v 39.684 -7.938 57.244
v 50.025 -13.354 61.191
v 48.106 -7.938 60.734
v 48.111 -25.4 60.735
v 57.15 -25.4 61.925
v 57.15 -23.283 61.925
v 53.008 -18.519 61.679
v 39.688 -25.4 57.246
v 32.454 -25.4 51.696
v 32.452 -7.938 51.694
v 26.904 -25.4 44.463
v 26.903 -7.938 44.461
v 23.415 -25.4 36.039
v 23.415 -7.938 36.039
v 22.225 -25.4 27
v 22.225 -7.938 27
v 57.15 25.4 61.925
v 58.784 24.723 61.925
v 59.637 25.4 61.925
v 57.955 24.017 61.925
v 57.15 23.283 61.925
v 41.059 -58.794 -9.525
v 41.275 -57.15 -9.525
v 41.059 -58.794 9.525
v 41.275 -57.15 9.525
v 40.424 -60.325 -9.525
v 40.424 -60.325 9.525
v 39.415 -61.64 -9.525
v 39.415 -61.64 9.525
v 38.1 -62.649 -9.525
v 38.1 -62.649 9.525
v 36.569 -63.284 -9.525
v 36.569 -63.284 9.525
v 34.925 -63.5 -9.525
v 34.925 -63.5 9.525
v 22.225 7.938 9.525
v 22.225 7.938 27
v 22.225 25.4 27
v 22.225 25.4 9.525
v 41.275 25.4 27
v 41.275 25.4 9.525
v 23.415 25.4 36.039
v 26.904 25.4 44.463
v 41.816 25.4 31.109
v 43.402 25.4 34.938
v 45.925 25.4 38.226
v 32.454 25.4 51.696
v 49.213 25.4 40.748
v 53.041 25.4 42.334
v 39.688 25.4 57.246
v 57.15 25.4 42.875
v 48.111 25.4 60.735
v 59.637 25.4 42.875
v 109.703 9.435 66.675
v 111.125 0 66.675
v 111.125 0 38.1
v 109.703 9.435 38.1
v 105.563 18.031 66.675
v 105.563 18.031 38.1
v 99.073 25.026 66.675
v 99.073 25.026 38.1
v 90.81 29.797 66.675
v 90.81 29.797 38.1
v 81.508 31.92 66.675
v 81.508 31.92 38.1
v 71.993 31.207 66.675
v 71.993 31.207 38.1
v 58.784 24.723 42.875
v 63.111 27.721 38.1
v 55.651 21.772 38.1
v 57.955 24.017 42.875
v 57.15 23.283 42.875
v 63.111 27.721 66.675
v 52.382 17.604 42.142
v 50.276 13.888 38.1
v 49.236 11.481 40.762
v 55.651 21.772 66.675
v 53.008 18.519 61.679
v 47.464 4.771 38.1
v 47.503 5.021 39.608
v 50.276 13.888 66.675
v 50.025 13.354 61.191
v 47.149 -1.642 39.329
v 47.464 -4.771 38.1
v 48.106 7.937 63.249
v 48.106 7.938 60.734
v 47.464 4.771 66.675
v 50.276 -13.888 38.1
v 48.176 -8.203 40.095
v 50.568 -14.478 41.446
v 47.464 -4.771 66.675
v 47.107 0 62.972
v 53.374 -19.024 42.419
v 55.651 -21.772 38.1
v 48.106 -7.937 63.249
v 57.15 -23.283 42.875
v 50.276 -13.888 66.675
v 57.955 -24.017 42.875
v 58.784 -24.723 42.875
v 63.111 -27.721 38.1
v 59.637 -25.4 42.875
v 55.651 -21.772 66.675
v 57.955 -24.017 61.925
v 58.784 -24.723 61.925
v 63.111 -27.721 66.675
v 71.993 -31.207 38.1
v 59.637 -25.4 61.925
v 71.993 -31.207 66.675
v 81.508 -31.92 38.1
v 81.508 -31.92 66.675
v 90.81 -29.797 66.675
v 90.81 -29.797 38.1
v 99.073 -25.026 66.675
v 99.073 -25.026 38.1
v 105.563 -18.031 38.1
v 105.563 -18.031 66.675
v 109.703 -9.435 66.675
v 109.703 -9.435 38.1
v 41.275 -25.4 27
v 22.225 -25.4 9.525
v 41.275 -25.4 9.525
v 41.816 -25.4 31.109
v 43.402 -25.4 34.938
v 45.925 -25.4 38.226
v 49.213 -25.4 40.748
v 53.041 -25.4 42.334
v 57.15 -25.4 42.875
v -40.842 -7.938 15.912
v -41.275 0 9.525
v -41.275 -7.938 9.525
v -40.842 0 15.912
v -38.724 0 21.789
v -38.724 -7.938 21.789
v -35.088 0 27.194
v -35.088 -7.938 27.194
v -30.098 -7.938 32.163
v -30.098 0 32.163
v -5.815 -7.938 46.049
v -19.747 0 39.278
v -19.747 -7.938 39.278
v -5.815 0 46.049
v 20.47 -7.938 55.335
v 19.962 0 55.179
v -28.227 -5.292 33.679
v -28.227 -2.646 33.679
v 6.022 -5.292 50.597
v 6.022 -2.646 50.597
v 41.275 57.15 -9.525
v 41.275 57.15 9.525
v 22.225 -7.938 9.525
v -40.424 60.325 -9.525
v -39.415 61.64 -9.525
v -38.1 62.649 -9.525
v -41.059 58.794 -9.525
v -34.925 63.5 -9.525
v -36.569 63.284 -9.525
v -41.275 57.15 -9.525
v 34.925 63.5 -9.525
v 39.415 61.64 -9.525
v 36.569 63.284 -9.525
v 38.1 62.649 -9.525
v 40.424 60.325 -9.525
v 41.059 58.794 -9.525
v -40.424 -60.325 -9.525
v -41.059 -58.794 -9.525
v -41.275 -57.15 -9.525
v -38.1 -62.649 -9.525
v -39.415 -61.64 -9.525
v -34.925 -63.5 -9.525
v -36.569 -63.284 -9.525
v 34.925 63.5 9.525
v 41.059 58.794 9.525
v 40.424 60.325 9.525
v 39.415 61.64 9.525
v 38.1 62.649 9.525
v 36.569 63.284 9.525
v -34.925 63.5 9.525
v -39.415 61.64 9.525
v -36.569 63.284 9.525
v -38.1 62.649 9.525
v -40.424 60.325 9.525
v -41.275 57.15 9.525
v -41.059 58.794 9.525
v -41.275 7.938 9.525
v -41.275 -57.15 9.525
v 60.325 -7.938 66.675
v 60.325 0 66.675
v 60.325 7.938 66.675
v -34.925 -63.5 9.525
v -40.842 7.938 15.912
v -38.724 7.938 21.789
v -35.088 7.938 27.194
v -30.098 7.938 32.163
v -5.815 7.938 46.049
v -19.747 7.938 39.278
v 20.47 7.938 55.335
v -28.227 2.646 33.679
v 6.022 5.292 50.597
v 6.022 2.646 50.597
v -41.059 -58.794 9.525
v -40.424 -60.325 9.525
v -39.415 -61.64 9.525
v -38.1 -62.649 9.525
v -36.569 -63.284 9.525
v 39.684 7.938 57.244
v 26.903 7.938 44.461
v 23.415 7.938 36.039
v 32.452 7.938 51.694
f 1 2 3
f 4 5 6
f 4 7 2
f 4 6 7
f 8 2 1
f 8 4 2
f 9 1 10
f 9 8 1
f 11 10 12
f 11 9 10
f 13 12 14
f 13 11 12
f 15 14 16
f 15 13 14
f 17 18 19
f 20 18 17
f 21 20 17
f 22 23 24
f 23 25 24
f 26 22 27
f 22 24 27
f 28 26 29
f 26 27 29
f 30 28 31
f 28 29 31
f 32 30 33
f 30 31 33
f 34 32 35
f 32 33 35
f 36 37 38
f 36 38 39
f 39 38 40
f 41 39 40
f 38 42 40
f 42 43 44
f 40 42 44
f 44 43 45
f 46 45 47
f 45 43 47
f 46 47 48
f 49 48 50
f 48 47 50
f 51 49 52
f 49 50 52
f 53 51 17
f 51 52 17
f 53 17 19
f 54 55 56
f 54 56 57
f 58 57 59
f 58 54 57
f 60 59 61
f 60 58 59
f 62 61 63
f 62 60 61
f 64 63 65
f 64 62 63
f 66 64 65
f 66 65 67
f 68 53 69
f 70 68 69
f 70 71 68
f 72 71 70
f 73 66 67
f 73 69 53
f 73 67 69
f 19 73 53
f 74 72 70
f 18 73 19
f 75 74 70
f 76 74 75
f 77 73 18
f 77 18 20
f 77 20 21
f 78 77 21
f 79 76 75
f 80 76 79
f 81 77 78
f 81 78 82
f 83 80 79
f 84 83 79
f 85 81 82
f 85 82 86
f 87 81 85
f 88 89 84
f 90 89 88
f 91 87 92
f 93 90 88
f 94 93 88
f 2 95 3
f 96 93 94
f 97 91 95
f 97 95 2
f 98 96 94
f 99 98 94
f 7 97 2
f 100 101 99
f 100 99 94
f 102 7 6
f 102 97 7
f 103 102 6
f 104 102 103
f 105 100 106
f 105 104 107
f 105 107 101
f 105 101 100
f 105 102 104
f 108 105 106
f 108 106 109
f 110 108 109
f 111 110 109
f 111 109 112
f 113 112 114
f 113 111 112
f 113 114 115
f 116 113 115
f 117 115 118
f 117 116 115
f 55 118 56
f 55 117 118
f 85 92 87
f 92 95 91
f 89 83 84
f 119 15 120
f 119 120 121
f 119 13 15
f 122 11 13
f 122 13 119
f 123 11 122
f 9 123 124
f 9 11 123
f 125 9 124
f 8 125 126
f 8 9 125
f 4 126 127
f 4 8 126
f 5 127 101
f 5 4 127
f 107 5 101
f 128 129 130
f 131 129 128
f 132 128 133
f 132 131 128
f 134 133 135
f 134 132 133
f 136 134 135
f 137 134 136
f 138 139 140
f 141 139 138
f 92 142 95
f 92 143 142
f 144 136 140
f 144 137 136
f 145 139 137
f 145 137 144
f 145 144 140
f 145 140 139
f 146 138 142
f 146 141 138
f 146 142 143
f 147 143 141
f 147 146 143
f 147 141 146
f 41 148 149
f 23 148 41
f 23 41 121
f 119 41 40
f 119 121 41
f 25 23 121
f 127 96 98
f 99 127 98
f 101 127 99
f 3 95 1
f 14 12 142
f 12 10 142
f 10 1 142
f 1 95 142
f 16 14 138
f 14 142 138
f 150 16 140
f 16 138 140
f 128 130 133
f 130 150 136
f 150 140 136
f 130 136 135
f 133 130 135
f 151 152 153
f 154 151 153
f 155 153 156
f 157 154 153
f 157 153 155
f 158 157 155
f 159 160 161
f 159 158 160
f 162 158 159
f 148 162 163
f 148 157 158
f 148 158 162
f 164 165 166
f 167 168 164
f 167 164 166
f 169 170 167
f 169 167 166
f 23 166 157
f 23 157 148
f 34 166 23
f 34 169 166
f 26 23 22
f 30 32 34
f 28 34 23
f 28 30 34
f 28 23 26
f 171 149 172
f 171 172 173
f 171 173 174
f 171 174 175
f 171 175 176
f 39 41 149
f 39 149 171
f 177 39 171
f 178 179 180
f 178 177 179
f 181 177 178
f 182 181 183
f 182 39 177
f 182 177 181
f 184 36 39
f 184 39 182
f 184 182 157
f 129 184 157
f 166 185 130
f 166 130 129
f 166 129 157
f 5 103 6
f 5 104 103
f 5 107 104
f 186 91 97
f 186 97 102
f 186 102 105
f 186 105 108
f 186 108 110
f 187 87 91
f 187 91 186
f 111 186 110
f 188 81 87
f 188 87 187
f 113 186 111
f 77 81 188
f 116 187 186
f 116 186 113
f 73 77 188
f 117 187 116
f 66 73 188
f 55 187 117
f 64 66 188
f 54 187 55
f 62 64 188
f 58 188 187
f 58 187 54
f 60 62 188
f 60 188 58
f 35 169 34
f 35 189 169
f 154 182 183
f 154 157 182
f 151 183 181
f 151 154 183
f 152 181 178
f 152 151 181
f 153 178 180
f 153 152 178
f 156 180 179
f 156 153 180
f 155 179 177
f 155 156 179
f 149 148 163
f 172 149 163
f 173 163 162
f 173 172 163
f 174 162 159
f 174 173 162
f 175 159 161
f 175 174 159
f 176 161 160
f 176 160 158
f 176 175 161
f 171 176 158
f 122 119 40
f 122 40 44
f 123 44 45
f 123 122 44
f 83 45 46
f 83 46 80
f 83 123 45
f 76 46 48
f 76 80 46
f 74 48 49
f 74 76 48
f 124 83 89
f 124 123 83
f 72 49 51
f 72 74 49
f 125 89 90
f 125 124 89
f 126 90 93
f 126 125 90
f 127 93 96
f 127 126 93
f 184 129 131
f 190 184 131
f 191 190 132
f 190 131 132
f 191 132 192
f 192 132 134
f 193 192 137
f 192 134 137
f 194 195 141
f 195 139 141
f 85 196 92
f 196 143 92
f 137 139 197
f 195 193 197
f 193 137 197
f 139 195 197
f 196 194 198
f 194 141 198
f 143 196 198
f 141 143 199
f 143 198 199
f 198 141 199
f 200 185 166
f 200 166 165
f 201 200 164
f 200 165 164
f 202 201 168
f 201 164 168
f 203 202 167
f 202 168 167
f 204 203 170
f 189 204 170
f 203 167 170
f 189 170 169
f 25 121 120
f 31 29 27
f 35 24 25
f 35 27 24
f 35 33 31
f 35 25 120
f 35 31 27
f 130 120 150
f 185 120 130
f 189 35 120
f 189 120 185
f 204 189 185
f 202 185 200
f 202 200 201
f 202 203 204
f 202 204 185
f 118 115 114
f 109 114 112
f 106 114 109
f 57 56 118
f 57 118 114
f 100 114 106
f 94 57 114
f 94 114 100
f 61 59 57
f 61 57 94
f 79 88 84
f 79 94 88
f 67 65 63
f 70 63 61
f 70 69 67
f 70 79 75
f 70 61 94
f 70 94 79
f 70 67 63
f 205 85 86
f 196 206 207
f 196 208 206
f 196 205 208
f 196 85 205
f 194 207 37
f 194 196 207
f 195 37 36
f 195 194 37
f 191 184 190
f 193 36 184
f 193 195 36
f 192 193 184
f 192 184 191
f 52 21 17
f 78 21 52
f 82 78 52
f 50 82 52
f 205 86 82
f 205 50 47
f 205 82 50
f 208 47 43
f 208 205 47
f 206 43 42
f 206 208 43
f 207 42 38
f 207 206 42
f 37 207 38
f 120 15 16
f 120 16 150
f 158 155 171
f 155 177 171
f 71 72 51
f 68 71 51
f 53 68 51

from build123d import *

# Parameters (mm, degrees)
F1_DEPTH = 63.5
F2_DEPTH = 25.4
F3_DEPTH = 7.9375
F5_R     = 6.35


with BuildPart() as f1:
    # F0 (on Front) → F1 (new body, symmetric)
    with BuildSketch(Plane.XZ):
        Polygon((-41.275, -9.525), (41.275, -9.525), (41.275, 9.525), (22.225, 9.525), (-41.275, 9.525), align=None)
    extrude(amount=F1_DEPTH, both=True)

    # F0 (on Front) → F2 (join, symmetric)
    with BuildSketch(Plane.XZ):
        with BuildLine():
            Line((22.225, 9.525), (41.275, 9.525))
            Line((41.275, 9.525), (41.275, 27.0002))
            ThreePointArc((41.275, 27.0002), (45.92468, 38.22552), (57.15, 42.8752))
            Line((57.15, 42.8752), (60.325, 42.8752))
            Line((60.325, 42.8752), (60.325, 61.9252))
            Line((60.325, 61.9252), (57.15, 61.9252))
            ThreePointArc((57.15, 61.9252), (32.454296, 51.695904), (22.225, 27.0002))
            Line((22.225, 27.0002), (22.225, 9.525))
        make_face()
    extrude(amount=F2_DEPTH, both=True)

    # F0 (on Front) → F3 (join, symmetric)
    with BuildSketch(Plane.XZ):
        with BuildLine():
            add(Edge.make_bspline(
                [(-41.275, 9.525), (-43.483493, 41.179909), (17.105941, 54.288729), (60.325, 66.675)],
                knots=[0, 0, 0, 0, 116.570504, 116.570504, 116.570504, 116.570504], degree=3))
            Line((-41.275, 9.525), (22.225, 9.525))
            Line((22.225, 9.525), (22.225, 27.0002))
            ThreePointArc((22.225, 27.0002), (32.454296, 51.695904), (57.15, 61.9252))
            Line((57.15, 61.9252), (60.325, 61.9252))
            Line((60.325, 61.9252), (60.325, 66.675))
        make_face()
    extrude(amount=F3_DEPTH, both=True)

    # F0 (on Front) → F4 (revolve)
    with BuildSketch(Plane.XZ):
        Polygon((111.125, 66.675), (79.115786, 66.675), (79.115786, 61.9252), (79.115786, 42.8752), (79.115786, 38.1), (111.125, 38.1), align=None)
    revolve(axis=Axis((79.115786, 0, 52.3875), (0, 0, 1)))

    # F5
    f5_edges = [f1.edges().sort_by_distance(p)[0] for p in [
        (41.275, -63.5, 0),
        (-41.275, -63.5, 0),
        (-41.275, 63.5, 0),
        (41.275, 63.5, 0),
    ]]
    fillet(f5_edges, radius=F5_R)


solid = f1.part
